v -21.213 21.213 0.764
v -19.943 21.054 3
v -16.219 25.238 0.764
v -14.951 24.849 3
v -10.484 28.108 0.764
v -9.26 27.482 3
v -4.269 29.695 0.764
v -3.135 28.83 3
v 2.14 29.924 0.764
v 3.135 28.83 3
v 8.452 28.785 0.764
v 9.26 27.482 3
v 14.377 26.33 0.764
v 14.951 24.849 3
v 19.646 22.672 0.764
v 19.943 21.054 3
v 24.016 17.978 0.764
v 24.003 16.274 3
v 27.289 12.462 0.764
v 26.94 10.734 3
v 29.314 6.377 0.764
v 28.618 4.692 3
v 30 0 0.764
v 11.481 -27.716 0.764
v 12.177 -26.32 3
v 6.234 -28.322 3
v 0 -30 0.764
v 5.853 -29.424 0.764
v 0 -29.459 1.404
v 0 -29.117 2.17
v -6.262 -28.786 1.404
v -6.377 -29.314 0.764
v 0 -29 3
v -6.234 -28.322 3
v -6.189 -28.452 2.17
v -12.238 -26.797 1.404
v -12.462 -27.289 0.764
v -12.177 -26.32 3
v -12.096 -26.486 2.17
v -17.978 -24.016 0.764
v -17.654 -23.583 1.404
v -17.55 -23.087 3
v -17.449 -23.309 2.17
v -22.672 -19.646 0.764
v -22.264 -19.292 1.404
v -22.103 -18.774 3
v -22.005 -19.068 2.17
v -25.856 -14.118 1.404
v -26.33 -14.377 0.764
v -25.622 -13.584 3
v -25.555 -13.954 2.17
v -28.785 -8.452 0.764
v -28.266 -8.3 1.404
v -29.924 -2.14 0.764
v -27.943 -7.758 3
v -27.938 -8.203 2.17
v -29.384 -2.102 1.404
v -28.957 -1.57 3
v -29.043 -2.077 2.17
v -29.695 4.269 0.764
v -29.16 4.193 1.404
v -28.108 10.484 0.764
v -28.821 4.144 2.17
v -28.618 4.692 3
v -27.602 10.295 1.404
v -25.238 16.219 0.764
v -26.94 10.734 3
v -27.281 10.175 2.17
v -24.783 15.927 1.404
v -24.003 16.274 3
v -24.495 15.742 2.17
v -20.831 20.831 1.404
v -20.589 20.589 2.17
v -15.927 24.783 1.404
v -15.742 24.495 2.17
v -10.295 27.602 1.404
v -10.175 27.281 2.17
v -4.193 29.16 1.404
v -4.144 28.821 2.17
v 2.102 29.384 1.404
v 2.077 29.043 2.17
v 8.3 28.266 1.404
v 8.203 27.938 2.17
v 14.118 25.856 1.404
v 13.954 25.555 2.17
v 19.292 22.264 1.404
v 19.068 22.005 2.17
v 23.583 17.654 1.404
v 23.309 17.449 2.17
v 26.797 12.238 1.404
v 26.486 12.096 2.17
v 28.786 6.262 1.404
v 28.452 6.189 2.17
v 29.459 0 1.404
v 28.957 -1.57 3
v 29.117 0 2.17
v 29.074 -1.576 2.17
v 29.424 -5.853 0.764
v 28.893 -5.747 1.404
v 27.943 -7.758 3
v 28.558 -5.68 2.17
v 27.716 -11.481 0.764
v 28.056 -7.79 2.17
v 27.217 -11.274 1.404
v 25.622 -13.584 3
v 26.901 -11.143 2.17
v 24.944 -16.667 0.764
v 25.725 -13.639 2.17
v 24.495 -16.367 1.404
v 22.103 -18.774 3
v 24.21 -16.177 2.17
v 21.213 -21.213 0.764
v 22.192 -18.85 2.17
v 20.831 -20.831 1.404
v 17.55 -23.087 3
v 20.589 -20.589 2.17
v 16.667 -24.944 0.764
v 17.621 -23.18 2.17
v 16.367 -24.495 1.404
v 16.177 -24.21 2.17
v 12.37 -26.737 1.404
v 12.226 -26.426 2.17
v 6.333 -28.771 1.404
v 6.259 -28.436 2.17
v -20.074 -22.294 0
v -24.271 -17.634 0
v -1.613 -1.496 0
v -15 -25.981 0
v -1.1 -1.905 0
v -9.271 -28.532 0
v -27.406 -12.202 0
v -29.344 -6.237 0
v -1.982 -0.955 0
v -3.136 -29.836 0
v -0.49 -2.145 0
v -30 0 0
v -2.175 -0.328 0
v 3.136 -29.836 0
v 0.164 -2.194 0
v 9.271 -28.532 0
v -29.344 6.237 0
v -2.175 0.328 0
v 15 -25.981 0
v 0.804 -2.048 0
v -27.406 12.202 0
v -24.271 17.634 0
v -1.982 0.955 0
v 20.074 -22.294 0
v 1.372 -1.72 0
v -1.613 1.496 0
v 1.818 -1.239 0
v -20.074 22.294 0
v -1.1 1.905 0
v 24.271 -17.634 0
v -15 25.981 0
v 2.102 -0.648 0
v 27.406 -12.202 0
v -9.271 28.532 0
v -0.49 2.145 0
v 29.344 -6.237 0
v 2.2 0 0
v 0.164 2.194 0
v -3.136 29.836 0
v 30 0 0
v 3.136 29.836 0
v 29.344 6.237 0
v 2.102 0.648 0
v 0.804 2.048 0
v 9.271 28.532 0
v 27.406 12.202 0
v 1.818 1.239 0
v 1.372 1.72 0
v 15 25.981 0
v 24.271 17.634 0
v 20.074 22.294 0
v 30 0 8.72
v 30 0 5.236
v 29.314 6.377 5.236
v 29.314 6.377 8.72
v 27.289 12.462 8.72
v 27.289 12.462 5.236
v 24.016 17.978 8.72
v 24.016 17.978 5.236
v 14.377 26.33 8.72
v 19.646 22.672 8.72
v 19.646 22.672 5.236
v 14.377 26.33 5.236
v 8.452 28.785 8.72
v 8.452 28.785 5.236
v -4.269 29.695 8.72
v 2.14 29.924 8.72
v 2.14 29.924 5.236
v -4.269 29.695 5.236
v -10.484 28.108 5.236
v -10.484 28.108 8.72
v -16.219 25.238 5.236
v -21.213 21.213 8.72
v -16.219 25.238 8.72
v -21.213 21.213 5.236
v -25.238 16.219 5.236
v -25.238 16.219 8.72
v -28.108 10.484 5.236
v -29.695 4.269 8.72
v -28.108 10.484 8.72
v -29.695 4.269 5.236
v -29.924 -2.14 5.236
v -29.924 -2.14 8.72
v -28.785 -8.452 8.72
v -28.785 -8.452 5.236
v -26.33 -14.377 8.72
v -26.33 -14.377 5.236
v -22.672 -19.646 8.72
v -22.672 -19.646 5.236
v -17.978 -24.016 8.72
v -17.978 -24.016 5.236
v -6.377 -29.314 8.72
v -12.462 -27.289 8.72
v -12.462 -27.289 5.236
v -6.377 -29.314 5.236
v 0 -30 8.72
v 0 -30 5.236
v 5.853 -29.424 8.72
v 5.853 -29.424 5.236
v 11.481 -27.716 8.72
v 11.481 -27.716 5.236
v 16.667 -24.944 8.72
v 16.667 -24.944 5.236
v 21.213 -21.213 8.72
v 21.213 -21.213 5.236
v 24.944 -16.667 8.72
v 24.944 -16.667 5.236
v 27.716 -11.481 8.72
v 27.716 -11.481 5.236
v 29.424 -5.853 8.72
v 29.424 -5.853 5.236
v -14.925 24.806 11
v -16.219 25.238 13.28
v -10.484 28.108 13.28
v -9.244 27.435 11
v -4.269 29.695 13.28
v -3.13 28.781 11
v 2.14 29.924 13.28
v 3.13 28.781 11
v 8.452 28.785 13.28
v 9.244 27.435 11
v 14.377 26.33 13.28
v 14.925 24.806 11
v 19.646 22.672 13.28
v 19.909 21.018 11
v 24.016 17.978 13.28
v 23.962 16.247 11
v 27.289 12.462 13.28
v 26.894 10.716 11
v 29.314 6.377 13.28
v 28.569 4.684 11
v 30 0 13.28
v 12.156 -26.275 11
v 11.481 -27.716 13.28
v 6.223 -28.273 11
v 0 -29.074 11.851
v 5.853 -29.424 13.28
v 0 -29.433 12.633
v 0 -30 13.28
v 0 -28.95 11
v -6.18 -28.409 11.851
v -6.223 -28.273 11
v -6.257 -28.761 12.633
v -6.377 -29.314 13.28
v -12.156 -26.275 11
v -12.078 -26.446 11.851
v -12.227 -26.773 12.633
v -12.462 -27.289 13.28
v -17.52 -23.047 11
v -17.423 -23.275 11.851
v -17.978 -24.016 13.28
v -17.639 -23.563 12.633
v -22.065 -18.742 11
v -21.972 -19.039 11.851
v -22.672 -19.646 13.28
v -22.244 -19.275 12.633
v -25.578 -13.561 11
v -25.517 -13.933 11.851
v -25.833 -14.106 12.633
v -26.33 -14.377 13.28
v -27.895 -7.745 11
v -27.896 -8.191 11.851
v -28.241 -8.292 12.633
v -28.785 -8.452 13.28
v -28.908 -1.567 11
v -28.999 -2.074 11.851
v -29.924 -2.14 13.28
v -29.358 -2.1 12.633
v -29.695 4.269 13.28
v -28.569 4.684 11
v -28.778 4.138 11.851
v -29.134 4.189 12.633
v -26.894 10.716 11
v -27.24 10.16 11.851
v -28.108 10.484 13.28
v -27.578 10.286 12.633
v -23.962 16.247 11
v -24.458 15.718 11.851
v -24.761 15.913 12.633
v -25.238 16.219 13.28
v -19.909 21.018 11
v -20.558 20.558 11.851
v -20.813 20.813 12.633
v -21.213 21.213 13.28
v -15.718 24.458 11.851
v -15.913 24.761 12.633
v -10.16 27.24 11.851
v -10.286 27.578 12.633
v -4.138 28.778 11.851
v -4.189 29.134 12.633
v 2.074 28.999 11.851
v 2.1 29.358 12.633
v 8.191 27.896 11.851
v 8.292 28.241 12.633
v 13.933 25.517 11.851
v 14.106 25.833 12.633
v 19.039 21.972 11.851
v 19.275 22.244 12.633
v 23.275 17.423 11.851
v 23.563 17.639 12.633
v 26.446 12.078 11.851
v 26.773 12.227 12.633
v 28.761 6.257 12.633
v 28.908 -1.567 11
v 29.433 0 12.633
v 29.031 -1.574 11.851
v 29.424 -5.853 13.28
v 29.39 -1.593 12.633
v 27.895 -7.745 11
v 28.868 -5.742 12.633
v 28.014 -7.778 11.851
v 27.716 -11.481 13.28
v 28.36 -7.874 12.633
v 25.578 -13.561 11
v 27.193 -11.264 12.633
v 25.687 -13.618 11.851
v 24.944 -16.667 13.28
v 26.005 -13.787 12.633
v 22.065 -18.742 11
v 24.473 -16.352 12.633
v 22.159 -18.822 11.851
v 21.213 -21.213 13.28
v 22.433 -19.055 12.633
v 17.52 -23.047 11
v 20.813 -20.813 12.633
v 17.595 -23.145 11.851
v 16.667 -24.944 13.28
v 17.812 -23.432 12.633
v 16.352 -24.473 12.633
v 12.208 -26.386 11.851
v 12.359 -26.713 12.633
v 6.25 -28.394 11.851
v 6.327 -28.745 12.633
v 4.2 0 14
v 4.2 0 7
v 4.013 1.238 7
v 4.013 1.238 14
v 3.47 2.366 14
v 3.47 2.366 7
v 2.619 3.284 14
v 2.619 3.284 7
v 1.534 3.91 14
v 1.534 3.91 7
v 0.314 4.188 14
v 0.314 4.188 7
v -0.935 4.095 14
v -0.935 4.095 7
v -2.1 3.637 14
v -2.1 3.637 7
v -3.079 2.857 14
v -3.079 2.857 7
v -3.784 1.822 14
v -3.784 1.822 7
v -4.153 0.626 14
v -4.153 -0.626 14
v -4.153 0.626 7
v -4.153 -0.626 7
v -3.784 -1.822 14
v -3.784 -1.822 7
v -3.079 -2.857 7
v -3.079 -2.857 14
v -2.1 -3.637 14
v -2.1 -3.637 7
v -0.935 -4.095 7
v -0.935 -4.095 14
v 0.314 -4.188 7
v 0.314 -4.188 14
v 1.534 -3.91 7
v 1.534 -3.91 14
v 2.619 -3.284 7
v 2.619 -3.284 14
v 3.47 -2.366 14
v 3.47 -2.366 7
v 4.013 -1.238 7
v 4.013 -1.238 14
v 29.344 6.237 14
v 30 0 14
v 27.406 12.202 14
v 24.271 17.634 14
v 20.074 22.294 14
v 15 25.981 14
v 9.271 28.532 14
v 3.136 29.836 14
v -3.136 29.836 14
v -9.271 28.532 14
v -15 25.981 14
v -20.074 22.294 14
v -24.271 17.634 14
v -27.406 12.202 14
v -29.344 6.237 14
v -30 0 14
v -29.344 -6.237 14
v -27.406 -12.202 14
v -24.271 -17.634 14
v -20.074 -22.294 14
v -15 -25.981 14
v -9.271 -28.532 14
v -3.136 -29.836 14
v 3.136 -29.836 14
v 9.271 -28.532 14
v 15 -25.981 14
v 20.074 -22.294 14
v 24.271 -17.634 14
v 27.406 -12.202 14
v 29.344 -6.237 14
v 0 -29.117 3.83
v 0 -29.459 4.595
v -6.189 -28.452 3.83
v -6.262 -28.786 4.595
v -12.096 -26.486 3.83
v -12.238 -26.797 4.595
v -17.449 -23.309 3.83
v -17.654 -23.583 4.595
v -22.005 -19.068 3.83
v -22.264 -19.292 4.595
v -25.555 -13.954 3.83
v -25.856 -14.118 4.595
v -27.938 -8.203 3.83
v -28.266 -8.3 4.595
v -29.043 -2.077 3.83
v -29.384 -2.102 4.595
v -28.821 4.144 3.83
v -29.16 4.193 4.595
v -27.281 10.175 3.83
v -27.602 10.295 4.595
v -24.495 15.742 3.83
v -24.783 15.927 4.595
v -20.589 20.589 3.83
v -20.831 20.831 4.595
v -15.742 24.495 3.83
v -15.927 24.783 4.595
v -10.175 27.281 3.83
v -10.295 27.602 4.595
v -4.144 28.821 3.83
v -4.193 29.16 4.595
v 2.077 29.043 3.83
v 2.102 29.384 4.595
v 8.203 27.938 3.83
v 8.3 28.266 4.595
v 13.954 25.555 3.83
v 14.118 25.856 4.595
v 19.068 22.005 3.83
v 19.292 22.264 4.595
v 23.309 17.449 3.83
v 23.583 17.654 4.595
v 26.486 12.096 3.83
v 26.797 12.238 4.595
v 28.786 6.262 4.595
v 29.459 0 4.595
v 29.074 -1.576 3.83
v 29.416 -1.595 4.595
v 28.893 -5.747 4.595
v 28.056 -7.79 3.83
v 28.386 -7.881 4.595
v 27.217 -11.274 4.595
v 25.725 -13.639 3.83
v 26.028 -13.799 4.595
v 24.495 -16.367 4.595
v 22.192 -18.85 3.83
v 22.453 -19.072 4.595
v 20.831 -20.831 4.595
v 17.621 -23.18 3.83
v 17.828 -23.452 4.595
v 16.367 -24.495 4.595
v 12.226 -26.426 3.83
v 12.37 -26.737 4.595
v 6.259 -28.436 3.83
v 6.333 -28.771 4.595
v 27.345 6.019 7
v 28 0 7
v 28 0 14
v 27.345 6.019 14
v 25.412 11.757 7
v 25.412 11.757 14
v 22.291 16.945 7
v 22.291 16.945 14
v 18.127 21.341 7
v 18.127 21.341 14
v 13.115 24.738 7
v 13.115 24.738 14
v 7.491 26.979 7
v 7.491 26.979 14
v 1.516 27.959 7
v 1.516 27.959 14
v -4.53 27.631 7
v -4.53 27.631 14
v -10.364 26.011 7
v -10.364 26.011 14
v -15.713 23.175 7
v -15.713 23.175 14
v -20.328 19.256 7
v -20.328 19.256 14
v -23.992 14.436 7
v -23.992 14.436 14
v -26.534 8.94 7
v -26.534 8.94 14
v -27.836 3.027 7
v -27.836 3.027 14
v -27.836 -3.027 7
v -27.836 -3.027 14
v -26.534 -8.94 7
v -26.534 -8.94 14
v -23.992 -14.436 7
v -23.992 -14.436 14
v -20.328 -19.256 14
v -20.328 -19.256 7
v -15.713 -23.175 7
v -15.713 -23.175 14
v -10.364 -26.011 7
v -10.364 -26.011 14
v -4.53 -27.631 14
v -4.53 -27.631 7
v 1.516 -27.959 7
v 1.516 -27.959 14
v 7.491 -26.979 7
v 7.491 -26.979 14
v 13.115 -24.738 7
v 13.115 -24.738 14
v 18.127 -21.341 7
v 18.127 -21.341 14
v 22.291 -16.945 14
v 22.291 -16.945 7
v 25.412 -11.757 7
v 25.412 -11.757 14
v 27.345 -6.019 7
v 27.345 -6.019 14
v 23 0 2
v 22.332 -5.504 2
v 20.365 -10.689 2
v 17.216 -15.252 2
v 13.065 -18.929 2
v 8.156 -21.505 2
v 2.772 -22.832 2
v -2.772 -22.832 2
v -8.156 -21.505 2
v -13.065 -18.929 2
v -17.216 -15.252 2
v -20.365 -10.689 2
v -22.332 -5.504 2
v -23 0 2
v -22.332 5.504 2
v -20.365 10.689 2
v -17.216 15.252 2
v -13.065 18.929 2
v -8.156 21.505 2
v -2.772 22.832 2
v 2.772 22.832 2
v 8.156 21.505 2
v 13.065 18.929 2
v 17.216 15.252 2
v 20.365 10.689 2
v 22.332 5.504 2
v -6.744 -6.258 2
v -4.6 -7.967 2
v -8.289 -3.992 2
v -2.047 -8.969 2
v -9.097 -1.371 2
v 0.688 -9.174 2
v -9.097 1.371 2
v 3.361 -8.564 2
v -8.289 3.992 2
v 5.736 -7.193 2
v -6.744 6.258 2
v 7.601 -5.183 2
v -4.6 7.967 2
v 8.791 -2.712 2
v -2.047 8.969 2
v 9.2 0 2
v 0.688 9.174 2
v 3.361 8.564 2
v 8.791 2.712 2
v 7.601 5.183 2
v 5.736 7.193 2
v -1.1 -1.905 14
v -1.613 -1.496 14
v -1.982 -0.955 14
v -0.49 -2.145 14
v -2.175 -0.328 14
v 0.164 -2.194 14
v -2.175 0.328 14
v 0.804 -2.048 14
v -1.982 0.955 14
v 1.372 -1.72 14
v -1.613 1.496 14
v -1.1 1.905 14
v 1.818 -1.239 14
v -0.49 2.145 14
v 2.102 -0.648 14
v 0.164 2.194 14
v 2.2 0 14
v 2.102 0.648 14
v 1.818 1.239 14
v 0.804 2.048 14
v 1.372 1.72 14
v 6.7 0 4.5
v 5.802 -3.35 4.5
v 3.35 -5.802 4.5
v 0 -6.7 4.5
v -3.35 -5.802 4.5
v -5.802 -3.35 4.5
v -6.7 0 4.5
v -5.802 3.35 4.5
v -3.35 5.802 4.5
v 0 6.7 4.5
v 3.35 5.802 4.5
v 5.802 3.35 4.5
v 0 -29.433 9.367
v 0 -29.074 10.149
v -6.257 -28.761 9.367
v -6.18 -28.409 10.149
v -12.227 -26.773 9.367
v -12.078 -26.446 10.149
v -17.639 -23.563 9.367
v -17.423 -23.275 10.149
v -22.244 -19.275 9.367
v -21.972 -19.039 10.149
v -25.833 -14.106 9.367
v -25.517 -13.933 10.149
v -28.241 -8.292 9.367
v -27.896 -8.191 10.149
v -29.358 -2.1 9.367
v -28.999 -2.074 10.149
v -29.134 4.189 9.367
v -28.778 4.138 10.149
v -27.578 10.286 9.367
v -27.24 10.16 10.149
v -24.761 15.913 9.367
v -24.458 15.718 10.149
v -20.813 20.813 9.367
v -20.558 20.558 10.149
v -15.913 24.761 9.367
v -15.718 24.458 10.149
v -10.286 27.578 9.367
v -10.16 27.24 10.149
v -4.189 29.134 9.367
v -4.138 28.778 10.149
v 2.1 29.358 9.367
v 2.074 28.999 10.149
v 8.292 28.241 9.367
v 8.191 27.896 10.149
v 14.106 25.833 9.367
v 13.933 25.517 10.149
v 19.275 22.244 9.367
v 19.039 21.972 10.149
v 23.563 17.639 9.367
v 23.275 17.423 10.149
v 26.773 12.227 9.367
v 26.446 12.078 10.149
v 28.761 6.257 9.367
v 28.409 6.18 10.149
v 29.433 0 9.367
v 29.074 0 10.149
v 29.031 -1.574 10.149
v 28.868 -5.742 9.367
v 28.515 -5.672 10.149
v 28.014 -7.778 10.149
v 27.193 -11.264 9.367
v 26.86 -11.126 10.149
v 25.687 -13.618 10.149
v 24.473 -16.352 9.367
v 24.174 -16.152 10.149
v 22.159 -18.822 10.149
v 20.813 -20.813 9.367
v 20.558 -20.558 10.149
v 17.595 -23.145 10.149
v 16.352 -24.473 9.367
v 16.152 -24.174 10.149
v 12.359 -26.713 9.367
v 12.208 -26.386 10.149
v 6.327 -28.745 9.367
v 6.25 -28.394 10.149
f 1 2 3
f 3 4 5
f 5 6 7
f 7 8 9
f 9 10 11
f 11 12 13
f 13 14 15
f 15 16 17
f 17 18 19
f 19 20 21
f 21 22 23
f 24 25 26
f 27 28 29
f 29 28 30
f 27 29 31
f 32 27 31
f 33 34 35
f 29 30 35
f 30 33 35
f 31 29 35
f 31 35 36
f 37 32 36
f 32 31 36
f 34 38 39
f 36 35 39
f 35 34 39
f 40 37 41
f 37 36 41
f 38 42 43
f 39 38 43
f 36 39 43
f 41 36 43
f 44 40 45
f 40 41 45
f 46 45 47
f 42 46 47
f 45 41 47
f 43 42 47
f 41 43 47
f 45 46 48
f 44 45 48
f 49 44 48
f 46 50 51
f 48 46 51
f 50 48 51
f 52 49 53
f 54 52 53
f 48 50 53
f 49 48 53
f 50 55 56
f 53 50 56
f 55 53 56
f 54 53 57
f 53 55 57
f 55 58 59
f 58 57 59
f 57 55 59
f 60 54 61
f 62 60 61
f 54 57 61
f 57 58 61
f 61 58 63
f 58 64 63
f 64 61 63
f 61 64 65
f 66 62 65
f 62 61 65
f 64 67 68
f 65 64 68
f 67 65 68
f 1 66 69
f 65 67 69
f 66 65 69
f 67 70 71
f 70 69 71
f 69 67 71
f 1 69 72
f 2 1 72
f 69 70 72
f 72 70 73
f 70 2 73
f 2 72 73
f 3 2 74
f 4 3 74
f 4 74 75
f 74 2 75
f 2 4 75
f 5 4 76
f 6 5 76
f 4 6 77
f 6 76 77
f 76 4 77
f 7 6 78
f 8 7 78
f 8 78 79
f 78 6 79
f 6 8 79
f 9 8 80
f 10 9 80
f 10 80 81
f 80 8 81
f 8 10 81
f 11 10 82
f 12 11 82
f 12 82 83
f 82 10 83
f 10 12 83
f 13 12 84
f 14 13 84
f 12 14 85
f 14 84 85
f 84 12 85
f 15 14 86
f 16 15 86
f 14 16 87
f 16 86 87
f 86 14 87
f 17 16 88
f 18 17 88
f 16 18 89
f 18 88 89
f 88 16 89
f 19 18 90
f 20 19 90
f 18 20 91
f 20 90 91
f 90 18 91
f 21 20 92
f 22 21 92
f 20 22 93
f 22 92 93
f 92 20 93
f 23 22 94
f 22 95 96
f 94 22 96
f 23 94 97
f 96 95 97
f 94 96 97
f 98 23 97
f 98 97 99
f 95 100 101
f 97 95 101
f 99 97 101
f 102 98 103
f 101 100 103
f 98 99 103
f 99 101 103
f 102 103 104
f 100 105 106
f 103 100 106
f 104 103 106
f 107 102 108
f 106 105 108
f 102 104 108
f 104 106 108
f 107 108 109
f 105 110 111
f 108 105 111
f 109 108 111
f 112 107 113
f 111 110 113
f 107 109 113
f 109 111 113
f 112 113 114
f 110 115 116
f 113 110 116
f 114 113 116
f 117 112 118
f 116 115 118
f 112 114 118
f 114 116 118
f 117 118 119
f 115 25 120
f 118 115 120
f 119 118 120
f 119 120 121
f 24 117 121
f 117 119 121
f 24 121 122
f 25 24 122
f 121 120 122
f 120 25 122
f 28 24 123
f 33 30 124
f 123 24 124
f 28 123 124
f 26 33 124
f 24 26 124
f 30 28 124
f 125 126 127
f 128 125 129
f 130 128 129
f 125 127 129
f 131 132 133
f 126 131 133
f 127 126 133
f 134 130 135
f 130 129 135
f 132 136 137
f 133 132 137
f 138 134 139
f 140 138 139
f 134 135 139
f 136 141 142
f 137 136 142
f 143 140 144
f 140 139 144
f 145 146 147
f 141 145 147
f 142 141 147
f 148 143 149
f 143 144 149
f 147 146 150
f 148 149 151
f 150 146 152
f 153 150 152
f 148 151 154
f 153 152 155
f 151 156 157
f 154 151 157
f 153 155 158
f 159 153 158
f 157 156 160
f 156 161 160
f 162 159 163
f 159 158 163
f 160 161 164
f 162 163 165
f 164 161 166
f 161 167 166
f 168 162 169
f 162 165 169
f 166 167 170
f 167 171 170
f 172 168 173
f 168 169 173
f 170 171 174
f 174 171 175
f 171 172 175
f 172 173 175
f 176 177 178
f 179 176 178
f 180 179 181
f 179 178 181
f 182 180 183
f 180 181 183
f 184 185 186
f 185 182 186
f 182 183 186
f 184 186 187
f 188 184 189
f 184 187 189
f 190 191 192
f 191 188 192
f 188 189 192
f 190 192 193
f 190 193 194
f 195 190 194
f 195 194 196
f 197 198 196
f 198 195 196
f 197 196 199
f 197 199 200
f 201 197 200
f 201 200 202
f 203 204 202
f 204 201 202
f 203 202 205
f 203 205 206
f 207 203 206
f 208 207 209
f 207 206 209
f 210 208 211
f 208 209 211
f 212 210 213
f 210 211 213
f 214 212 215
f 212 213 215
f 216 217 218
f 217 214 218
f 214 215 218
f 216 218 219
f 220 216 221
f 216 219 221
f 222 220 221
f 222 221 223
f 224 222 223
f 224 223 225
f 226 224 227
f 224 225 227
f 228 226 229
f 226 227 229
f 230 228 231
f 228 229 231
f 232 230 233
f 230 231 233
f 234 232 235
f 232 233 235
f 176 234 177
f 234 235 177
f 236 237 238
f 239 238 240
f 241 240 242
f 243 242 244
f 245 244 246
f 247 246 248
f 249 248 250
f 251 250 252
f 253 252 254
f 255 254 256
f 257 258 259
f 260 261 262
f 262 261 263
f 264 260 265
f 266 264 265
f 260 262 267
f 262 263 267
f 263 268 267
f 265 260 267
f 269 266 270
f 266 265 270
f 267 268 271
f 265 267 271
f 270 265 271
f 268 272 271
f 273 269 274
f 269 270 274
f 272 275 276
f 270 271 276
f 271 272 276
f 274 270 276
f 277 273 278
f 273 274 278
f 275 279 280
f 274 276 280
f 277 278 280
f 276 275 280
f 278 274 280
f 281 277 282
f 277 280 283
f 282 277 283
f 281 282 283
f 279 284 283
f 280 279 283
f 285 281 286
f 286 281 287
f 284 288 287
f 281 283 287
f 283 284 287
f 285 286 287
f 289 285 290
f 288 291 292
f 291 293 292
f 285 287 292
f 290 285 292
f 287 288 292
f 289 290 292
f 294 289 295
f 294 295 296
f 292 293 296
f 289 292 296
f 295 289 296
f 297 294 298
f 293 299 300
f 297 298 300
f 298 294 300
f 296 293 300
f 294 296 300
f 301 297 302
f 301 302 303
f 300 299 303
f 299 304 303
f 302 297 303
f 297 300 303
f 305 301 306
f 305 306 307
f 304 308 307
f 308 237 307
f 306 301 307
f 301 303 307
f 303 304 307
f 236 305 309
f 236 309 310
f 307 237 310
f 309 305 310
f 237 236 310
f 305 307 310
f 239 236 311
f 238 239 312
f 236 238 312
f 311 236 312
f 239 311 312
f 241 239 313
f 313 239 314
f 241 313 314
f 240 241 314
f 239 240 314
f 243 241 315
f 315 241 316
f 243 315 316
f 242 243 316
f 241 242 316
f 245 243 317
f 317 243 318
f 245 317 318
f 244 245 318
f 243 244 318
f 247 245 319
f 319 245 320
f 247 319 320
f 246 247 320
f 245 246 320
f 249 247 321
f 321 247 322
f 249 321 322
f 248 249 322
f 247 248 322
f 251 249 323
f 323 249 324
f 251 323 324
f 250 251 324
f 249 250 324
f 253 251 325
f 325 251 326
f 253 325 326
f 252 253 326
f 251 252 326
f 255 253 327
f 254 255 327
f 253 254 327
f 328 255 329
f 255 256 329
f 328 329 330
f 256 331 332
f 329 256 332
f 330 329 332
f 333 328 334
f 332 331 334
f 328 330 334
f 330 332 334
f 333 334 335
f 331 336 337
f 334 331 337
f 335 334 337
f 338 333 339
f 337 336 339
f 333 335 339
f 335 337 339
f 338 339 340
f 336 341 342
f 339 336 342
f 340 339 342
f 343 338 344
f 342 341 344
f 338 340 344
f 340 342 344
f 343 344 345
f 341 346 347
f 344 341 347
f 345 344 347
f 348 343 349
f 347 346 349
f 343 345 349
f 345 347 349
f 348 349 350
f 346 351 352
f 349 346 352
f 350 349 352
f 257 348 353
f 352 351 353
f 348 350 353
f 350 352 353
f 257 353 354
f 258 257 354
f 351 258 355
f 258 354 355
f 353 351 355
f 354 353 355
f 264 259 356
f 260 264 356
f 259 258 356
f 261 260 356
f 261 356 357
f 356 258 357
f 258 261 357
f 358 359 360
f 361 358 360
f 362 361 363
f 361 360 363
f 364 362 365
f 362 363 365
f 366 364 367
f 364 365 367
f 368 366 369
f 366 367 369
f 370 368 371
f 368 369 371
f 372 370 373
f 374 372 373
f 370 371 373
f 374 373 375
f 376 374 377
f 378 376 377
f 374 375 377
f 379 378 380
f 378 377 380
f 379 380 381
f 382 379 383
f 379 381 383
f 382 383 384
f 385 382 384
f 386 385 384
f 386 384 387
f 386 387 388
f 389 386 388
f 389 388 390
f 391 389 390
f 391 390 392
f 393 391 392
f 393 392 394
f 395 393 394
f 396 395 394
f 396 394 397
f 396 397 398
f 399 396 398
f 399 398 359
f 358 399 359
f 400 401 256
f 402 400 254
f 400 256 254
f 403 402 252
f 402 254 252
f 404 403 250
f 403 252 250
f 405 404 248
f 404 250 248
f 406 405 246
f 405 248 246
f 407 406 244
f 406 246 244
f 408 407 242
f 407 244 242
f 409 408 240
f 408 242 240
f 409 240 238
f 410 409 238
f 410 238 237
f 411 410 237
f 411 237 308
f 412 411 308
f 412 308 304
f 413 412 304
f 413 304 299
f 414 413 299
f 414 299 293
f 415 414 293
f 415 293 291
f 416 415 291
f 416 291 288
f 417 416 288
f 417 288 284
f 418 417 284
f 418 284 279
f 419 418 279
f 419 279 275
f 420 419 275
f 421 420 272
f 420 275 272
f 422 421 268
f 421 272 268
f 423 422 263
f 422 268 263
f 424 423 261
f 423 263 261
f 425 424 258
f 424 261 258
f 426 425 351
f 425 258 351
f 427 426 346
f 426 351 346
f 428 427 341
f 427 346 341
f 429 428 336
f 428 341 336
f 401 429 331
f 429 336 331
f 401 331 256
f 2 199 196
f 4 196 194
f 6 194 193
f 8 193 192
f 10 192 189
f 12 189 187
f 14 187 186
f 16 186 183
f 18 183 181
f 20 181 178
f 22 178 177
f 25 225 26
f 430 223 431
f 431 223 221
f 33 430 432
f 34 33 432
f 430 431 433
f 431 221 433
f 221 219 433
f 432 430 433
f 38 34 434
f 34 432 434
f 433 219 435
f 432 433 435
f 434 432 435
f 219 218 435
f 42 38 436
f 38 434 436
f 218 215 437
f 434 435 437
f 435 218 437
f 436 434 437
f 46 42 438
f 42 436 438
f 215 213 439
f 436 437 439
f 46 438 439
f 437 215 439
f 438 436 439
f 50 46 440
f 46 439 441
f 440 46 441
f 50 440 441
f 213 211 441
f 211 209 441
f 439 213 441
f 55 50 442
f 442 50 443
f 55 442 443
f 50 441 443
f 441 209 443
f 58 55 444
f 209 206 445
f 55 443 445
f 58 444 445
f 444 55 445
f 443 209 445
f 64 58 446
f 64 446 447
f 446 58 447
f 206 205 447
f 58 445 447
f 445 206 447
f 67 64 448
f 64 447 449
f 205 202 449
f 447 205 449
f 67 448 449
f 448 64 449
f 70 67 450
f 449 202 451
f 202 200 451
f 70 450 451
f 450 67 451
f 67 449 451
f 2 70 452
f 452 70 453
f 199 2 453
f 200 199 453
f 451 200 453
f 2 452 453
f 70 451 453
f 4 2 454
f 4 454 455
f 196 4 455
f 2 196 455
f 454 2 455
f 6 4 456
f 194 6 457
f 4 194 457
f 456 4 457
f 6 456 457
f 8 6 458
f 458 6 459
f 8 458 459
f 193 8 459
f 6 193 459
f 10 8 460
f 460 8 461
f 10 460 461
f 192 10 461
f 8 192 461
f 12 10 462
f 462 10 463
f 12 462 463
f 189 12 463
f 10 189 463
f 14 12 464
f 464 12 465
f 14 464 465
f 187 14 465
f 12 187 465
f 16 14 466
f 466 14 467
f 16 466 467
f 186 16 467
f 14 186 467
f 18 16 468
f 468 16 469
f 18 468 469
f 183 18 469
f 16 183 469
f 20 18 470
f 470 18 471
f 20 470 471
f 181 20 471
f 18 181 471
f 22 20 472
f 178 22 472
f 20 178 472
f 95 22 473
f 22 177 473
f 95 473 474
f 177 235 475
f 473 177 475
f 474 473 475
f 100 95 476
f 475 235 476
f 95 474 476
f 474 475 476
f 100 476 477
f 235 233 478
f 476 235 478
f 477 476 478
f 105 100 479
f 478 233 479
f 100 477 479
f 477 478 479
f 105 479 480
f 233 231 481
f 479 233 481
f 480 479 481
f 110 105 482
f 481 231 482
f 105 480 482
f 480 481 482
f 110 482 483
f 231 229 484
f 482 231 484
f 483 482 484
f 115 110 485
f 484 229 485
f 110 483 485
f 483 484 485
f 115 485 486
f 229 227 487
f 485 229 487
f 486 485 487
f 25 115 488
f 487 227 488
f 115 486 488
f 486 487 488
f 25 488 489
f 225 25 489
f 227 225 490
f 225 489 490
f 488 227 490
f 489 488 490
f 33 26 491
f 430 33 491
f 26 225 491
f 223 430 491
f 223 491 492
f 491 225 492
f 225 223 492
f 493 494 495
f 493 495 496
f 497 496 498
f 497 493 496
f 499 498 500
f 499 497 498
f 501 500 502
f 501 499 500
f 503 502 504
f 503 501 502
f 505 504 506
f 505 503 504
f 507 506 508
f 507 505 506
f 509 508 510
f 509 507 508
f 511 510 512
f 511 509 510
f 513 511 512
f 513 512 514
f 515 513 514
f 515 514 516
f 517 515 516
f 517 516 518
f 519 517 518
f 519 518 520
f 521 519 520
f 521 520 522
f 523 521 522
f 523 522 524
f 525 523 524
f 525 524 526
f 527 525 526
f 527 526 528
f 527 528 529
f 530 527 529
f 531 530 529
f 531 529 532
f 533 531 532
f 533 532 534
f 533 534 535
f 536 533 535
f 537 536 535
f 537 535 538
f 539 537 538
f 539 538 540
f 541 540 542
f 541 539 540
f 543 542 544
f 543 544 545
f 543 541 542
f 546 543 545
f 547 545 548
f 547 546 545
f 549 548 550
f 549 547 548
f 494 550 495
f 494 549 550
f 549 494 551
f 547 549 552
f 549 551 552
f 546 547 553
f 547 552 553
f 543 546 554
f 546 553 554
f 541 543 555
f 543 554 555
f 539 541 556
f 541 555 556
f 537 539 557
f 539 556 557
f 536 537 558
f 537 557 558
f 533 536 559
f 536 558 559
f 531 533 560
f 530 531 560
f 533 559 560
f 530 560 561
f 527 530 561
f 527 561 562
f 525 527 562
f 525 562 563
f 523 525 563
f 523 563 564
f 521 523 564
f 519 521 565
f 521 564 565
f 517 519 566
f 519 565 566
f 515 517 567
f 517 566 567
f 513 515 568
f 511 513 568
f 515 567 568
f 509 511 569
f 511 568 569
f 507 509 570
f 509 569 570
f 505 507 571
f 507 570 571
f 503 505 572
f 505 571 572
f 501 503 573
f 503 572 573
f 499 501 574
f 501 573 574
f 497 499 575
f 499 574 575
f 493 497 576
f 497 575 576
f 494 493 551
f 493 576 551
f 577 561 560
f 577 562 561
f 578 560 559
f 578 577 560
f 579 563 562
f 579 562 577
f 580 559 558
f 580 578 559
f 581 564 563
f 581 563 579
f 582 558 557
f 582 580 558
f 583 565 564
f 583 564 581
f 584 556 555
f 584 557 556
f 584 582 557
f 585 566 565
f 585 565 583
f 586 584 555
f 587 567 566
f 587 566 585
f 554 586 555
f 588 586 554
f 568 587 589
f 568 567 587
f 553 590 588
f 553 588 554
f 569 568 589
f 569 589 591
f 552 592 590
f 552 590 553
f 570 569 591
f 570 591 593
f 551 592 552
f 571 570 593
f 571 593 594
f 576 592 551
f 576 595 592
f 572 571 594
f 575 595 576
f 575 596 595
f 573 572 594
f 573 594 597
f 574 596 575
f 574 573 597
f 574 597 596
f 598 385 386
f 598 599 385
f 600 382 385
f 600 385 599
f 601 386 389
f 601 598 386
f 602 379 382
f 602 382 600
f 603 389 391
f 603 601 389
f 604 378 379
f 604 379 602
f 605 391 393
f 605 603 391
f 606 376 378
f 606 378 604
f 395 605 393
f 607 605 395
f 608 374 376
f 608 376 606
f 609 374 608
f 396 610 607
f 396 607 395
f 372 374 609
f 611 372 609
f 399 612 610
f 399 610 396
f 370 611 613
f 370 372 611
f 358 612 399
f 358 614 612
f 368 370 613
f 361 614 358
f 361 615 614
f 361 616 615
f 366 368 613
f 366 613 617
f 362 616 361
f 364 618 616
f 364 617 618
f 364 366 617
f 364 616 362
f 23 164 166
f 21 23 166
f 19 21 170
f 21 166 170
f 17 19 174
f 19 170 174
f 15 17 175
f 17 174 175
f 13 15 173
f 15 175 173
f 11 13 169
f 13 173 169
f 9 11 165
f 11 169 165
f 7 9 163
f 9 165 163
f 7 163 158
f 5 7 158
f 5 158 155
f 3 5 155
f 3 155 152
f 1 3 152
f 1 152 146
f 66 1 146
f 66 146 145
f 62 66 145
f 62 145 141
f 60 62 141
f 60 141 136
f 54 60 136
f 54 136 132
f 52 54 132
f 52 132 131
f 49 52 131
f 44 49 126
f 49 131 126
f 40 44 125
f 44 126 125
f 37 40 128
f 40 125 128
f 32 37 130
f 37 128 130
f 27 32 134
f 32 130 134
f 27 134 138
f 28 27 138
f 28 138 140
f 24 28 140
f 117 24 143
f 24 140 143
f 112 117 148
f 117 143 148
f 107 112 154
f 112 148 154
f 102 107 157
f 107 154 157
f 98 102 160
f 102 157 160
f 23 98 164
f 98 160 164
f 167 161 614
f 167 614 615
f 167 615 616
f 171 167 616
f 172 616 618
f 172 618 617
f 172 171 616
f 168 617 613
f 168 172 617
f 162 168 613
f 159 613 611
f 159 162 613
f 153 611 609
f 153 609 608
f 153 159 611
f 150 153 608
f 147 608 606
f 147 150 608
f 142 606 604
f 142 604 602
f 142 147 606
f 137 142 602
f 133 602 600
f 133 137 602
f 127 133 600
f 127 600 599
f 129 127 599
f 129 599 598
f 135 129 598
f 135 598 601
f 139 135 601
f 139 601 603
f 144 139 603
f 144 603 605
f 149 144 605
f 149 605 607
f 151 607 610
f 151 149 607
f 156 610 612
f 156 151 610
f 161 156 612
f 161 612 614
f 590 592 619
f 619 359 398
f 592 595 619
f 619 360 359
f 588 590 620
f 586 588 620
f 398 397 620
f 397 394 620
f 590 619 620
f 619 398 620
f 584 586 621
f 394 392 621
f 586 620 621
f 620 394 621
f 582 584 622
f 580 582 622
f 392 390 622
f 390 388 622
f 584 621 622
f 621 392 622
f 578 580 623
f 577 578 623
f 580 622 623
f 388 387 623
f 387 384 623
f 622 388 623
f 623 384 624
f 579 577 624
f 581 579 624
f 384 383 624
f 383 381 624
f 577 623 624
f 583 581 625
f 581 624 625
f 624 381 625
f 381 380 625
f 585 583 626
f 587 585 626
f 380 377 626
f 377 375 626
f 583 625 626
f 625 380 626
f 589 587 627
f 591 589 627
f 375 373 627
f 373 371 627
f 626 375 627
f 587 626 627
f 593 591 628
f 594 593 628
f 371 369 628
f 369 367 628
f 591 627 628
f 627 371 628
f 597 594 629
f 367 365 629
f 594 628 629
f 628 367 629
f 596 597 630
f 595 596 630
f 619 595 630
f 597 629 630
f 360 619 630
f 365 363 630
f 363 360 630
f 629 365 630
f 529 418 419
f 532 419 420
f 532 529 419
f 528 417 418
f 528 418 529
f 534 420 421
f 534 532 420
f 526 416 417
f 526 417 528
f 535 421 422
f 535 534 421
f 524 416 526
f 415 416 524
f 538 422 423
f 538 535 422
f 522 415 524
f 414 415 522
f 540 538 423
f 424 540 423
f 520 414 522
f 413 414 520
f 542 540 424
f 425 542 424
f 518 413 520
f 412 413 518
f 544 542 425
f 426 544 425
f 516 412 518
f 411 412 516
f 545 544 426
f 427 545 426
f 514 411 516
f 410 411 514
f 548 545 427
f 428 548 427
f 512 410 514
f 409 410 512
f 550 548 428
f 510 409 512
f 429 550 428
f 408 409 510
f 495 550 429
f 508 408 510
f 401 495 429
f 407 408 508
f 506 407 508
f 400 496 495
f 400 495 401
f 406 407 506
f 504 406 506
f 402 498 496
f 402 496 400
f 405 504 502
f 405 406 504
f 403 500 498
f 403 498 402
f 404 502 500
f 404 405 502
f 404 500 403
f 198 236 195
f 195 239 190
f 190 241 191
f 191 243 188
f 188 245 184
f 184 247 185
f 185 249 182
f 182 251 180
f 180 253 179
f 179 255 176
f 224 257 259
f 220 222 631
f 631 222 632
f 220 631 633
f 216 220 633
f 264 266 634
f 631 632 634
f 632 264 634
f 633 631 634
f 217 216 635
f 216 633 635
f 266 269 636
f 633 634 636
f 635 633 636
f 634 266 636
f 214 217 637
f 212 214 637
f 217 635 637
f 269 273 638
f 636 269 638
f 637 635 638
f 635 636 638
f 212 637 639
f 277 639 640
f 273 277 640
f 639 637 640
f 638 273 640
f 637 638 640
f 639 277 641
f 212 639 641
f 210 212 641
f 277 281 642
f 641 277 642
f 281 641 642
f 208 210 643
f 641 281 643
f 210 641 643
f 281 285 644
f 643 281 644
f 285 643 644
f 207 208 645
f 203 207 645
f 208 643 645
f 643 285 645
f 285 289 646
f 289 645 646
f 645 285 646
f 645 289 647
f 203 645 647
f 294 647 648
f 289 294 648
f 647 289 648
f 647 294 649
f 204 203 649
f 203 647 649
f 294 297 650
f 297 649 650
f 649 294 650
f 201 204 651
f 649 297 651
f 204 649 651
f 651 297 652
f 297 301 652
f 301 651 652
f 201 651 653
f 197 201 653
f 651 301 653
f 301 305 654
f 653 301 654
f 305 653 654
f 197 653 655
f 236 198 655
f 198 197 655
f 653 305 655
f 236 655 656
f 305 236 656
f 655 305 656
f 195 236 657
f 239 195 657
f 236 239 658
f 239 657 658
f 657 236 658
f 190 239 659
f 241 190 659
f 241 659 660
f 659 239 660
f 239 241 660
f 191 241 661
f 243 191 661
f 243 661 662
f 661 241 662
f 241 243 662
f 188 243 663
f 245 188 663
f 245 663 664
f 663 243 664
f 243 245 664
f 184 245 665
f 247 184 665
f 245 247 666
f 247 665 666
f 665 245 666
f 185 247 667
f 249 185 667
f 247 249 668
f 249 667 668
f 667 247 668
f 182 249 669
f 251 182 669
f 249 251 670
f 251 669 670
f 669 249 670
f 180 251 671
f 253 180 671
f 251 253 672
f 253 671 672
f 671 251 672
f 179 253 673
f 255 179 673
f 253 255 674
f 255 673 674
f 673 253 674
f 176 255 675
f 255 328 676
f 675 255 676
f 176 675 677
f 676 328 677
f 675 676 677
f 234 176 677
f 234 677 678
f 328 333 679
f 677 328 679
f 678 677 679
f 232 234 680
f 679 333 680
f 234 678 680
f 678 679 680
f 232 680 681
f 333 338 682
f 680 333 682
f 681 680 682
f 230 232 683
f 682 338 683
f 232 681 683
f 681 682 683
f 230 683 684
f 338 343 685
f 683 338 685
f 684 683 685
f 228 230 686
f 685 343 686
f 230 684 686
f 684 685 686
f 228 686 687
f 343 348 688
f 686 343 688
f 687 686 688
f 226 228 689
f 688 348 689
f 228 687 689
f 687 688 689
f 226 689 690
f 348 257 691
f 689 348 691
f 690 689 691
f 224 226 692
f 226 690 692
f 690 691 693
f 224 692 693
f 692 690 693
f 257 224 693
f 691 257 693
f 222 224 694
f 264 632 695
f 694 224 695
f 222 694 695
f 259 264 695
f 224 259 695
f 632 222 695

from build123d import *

# Parameters (mm, degrees)
F0_R     = 30
F0_R_2   = 2.2
F1_DEPTH = 14
F2_T     = -2
F3_SIZE  = 5
F4_R     = 3


with BuildPart() as f1:
    # F0 (on Top) → F1 (new body)
    with BuildSketch(Plane.XY):
        Circle(F0_R)
        Circle(F0_R_2, mode=Mode.SUBTRACT)
    extrude(amount=F1_DEPTH)

    # F2
    f2_openings = [f1.faces().sort_by_distance(p)[0] for p in [
        (-29.151472, 0, 14),
    ]]
    offset(amount=F2_T, openings=f2_openings)

    # F3
    f3_edges = [f1.edges().sort_by_distance(p)[0] for p in [
        (-28, 0, 2),
        (-4.2, 0, 2),
    ]]
    chamfer(f3_edges, length=F3_SIZE)

    # F5: sweep along a path in F5_path
    with BuildLine(Plane(origin=(30, 0, 14), x_dir=(0, -1, 0), z_dir=(0, 0, -1))) as f5_path:
        CenterArc((0, 30), 30, 0, 360)
    # F4 (on Front) → F5 (sweep, cut)
    with BuildSketch(Plane.XZ):
        with Locations((-32, 2.9998219346)):
            Circle(F4_R)
        with Locations((-31.9502516922, 11)):
            Circle(F4_R)
    sweep(path=f5_path.line, mode=Mode.SUBTRACT)


solid = f1.part
